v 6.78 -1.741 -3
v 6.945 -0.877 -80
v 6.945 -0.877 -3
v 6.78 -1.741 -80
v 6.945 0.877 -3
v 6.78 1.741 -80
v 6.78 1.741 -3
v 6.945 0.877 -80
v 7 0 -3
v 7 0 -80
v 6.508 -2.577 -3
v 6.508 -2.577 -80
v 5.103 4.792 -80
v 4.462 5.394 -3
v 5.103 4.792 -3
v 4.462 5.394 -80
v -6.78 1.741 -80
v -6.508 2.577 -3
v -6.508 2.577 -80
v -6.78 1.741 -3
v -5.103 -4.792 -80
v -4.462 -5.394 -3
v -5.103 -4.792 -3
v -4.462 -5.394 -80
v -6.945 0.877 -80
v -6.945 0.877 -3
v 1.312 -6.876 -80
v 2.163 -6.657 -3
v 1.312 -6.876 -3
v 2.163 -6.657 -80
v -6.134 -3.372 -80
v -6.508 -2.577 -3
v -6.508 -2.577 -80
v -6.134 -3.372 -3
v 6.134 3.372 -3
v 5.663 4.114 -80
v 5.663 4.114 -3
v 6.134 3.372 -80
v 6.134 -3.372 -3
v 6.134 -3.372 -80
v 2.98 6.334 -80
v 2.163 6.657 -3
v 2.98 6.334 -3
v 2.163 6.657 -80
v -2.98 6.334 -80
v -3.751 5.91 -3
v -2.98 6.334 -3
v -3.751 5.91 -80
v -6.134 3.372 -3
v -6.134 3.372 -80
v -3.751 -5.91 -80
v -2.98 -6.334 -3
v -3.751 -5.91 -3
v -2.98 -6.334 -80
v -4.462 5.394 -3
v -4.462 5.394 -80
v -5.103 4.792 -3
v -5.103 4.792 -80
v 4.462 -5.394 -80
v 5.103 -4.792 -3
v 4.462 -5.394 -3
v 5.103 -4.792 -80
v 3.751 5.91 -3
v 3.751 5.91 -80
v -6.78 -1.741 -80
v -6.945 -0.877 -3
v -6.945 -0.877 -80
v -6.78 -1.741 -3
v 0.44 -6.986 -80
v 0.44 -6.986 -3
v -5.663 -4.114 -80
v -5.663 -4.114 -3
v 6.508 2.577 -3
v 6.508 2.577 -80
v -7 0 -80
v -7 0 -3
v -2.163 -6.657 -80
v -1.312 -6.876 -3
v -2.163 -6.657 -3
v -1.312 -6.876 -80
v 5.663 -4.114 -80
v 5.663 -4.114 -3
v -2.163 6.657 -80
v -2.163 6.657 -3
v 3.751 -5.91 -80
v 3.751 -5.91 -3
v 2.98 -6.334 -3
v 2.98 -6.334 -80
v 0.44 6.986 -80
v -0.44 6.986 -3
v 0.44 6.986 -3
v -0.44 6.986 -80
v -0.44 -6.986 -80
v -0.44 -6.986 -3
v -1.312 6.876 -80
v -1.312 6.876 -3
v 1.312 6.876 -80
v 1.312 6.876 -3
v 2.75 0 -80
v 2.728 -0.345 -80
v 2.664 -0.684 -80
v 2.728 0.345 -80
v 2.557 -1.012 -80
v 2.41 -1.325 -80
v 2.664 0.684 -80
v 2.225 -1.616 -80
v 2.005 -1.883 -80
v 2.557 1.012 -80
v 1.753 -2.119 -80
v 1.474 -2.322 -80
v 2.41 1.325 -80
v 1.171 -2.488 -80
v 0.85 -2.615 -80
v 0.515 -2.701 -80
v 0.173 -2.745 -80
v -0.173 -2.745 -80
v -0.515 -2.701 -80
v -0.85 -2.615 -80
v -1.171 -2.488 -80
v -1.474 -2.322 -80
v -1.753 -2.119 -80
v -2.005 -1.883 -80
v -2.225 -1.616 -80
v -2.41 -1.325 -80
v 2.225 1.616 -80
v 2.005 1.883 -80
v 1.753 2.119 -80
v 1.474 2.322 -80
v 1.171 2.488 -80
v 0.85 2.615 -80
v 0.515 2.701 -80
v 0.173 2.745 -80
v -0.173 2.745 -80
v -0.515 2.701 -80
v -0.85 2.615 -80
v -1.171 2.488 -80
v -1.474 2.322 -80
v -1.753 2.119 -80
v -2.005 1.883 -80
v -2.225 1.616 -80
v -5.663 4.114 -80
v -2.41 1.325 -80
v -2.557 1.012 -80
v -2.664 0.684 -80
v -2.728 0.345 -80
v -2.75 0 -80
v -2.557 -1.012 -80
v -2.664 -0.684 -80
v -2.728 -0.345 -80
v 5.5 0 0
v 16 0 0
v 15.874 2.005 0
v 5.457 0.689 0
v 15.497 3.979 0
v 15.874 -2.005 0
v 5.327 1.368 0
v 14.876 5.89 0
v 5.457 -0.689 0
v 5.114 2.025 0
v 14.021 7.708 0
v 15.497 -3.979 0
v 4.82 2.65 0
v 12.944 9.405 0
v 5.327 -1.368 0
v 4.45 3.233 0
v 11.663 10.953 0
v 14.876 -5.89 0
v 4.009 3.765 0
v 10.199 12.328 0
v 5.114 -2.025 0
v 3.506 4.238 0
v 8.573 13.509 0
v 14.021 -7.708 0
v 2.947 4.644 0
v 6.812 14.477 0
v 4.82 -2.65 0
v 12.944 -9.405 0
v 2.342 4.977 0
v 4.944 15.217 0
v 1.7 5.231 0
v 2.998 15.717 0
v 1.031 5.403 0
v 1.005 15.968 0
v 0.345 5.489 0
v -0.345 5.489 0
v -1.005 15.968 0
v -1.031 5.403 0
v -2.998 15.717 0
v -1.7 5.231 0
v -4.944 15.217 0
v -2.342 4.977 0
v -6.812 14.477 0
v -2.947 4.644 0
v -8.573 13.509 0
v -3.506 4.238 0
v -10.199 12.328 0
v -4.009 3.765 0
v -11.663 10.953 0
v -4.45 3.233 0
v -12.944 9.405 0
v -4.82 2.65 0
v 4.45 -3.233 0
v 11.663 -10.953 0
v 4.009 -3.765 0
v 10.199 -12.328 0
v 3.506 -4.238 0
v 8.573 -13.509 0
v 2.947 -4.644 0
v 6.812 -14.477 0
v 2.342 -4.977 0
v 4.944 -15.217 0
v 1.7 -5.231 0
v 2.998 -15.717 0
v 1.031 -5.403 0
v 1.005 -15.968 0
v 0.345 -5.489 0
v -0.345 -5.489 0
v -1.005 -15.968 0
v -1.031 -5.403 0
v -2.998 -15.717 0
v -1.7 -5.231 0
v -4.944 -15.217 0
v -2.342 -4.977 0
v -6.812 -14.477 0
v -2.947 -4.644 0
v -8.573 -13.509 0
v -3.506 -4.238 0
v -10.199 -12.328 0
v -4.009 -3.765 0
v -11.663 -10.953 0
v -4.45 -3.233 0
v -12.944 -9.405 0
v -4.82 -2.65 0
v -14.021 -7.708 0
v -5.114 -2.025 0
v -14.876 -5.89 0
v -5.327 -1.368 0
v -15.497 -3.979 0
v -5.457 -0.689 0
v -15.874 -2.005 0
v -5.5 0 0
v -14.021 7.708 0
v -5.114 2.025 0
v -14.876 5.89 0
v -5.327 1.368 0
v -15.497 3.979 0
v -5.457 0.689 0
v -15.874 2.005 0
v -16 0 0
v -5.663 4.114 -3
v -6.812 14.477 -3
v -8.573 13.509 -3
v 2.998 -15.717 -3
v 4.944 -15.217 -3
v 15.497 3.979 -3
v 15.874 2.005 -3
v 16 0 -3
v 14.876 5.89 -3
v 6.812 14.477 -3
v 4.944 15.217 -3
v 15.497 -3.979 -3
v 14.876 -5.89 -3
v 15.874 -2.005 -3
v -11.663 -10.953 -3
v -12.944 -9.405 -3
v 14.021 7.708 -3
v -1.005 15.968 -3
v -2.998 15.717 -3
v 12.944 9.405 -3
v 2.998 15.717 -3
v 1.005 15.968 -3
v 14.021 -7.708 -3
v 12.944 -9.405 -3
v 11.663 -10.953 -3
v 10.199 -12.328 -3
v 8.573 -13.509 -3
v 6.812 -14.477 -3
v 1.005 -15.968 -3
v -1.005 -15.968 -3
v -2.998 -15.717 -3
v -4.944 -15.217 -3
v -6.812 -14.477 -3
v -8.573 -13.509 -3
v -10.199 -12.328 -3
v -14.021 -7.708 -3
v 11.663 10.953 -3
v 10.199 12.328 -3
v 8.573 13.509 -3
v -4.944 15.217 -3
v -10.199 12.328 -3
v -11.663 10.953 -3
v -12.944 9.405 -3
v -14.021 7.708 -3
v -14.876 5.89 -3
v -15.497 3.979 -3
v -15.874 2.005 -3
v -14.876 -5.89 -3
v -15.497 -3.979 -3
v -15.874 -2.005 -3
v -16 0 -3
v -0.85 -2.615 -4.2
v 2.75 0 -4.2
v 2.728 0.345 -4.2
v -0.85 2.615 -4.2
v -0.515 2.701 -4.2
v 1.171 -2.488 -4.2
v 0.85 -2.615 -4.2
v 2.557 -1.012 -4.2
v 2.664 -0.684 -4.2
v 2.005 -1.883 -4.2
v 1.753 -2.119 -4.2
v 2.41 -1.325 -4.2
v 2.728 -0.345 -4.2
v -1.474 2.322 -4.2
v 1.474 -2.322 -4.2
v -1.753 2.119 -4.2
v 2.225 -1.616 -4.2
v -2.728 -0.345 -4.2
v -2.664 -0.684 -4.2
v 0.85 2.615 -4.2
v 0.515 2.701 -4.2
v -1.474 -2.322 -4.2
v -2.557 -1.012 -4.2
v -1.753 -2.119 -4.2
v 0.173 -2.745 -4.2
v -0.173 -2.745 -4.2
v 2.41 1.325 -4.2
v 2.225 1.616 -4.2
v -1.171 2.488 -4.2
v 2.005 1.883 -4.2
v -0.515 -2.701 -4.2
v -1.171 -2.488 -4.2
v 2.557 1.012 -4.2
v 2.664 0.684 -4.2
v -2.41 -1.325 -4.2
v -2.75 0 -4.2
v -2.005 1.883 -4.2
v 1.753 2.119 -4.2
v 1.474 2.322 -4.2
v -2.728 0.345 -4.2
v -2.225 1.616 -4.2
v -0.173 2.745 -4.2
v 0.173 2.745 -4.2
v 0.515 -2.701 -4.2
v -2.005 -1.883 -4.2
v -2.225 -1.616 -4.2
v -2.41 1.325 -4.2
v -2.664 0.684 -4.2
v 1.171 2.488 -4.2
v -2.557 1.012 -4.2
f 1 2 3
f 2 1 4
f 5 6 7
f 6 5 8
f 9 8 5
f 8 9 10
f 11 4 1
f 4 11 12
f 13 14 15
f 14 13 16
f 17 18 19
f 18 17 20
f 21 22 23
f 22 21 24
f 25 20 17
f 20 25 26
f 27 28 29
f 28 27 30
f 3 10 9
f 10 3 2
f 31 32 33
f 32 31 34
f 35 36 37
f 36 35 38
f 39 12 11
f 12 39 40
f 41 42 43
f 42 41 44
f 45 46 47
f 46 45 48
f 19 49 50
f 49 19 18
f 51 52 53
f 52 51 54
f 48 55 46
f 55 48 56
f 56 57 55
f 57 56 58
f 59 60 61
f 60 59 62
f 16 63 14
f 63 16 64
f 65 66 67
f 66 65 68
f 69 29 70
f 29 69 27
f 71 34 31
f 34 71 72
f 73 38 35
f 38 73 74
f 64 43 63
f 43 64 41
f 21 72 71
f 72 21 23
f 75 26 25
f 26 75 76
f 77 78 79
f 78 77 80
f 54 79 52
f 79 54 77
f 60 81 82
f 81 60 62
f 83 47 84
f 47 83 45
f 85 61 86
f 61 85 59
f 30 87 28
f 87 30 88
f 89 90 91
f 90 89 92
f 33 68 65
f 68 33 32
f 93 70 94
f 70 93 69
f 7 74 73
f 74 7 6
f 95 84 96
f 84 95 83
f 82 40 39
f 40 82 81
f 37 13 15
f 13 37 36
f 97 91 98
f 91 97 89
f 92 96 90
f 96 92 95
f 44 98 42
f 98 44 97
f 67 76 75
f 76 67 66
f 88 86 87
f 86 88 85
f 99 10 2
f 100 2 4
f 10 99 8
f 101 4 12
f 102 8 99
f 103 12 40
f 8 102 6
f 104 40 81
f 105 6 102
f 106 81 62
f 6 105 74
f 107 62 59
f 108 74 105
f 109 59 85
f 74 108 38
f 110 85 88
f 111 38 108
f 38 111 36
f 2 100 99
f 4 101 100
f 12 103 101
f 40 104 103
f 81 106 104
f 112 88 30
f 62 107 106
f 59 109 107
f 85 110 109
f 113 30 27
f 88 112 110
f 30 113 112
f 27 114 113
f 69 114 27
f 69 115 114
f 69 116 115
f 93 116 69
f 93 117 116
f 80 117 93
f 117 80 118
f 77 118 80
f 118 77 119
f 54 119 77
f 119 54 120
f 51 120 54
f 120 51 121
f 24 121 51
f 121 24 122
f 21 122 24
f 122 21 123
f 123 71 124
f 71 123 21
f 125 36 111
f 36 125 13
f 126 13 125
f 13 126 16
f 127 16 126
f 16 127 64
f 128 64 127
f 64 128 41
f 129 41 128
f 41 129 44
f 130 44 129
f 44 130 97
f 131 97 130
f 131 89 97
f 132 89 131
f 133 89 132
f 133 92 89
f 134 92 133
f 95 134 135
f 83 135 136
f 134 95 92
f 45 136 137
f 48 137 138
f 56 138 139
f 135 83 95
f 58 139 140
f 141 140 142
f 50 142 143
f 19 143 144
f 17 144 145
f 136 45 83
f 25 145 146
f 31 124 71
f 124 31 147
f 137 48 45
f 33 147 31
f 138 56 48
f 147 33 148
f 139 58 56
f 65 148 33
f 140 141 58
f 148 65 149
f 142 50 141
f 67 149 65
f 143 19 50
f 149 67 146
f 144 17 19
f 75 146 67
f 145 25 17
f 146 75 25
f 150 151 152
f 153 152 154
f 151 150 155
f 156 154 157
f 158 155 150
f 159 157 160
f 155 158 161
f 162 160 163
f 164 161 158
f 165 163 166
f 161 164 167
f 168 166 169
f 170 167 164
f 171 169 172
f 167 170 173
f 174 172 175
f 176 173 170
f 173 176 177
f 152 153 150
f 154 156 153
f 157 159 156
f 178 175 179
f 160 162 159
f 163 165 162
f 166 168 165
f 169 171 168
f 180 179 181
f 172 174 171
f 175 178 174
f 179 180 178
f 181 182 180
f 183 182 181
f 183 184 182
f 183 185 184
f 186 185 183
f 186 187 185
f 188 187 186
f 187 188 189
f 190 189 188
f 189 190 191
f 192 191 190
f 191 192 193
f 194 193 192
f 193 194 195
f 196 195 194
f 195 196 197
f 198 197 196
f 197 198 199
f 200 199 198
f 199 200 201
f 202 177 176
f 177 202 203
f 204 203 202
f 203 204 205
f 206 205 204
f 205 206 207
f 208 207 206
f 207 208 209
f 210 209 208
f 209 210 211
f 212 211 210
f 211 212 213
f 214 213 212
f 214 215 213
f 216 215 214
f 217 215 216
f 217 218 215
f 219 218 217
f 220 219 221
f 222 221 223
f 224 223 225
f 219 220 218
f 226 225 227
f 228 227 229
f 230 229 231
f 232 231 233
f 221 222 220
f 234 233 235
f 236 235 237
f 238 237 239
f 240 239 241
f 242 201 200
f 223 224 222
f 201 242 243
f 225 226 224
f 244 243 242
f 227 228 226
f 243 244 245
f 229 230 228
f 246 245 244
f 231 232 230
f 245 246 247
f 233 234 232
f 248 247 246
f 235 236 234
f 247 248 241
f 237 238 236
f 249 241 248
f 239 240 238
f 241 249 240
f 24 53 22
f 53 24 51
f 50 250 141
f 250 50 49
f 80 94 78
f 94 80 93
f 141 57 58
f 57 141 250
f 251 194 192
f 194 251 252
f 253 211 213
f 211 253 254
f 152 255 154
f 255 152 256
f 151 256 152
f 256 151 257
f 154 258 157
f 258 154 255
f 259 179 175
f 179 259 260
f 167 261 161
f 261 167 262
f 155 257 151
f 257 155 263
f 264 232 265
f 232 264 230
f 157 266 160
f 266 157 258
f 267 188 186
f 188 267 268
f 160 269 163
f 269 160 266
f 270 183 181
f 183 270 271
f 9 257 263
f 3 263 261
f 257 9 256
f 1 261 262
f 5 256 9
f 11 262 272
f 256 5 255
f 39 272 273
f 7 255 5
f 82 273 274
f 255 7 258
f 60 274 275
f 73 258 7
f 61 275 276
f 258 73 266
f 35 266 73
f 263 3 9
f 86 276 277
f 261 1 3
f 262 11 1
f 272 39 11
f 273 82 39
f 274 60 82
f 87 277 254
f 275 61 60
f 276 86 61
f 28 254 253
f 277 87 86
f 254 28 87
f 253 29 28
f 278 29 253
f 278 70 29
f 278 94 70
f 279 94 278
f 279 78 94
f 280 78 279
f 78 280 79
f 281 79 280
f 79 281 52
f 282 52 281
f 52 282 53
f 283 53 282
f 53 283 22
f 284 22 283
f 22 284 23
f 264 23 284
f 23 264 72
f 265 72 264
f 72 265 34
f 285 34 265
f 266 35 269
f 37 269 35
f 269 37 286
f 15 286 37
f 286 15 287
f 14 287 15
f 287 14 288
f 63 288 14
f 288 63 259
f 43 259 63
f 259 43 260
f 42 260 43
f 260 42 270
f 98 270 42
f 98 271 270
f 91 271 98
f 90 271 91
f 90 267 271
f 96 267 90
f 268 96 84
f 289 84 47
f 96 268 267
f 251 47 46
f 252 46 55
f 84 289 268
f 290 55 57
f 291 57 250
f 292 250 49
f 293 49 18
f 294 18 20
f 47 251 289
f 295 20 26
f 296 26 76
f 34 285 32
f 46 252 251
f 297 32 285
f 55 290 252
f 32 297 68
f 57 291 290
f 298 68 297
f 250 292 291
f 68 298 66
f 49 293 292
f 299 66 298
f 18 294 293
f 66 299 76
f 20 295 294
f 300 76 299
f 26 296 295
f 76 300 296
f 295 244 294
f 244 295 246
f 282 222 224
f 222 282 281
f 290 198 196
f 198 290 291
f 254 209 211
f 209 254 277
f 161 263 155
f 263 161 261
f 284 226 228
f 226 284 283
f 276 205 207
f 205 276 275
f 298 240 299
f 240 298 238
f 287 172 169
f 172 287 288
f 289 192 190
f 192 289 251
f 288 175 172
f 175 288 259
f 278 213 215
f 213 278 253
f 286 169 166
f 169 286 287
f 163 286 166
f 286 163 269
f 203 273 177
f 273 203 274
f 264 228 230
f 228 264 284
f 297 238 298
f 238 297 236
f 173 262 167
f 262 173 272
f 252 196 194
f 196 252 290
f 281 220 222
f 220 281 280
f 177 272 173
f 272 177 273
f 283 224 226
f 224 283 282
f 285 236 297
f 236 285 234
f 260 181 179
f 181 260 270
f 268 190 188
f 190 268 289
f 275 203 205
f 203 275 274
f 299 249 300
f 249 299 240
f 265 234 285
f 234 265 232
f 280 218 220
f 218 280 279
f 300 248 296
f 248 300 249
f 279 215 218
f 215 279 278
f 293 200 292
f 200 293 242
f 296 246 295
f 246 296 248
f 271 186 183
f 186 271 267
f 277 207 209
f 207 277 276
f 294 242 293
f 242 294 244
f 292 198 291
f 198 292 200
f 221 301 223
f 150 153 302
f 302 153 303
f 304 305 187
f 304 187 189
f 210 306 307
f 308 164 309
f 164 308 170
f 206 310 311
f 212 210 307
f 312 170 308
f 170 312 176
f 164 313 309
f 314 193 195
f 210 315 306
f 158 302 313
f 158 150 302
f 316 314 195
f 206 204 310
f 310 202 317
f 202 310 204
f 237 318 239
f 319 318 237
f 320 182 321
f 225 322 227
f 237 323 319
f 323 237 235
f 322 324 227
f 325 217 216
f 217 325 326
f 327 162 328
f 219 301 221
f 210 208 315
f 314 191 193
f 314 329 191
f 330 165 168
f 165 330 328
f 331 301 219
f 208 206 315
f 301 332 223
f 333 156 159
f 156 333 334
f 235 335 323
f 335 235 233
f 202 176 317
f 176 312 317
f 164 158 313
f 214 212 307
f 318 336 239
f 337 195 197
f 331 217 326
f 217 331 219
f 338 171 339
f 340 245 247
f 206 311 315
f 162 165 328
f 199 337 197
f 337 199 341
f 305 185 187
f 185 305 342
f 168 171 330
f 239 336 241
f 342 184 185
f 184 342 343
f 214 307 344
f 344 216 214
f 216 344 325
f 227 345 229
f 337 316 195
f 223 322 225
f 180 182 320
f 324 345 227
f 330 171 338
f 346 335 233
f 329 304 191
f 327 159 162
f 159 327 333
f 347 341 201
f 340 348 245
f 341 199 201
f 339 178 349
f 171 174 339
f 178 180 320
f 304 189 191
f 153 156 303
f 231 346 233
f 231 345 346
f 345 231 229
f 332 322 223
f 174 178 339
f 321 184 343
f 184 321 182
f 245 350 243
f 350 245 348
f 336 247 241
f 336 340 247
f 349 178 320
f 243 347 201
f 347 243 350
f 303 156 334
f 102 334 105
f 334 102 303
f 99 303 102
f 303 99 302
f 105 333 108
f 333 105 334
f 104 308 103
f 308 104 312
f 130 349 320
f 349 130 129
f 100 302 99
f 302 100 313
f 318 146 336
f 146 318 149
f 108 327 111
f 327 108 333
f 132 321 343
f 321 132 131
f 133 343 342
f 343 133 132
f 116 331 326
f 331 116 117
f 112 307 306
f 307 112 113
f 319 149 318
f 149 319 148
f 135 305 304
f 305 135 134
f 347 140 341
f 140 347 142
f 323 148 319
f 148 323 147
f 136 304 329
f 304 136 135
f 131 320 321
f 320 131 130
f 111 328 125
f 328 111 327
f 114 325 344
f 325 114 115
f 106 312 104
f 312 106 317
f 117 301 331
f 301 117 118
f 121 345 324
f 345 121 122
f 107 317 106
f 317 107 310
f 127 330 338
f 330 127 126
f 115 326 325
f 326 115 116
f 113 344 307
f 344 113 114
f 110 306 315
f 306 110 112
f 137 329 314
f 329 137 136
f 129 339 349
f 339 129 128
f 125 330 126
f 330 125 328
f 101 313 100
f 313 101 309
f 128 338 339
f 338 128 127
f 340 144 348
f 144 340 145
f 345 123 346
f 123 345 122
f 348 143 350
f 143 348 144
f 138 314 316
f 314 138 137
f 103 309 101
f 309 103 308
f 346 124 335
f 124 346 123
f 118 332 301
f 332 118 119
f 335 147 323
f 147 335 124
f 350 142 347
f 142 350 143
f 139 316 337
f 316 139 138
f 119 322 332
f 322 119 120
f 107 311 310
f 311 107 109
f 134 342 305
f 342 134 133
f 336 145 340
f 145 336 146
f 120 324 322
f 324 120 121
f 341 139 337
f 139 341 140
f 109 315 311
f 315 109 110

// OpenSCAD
$fn = 50;


difference() {
	union() {
		translate(v = [0, 0, -80.0000000000]) {
			cylinder(h = 80, r = 7.0000000000);
		}
		translate(v = [0, 0, -3.0000000000]) {
			cylinder(h = 3, r = 16.0000000000);
		}
	}
	union() {
		translate(v = [0, 0, 0]) {
			rotate(a = [0, 0, 0]) {
				difference() {
					union() {
						#translate(v = [0, 0, -80.0000000000]) {
							cylinder(h = 80, r = 2.2500000000);
						}
						#translate(v = [0, 0, -4.2000000000]) {
							cylinder(h = 4.2000000000, r = 7.0000000000, r1 = 2.7500000000, r2 = 5.5000000000);
						}
						#translate(v = [0, 0, -80.0000000000]) {
							cylinder(h = 80, r = 2.7500000000);
						}
						#translate(v = [0, 0, -80.0000000000]) {
							cylinder(h = 80, r = 2.2500000000);
						}
					}
					union();
				}
			}
		}
	}
}
